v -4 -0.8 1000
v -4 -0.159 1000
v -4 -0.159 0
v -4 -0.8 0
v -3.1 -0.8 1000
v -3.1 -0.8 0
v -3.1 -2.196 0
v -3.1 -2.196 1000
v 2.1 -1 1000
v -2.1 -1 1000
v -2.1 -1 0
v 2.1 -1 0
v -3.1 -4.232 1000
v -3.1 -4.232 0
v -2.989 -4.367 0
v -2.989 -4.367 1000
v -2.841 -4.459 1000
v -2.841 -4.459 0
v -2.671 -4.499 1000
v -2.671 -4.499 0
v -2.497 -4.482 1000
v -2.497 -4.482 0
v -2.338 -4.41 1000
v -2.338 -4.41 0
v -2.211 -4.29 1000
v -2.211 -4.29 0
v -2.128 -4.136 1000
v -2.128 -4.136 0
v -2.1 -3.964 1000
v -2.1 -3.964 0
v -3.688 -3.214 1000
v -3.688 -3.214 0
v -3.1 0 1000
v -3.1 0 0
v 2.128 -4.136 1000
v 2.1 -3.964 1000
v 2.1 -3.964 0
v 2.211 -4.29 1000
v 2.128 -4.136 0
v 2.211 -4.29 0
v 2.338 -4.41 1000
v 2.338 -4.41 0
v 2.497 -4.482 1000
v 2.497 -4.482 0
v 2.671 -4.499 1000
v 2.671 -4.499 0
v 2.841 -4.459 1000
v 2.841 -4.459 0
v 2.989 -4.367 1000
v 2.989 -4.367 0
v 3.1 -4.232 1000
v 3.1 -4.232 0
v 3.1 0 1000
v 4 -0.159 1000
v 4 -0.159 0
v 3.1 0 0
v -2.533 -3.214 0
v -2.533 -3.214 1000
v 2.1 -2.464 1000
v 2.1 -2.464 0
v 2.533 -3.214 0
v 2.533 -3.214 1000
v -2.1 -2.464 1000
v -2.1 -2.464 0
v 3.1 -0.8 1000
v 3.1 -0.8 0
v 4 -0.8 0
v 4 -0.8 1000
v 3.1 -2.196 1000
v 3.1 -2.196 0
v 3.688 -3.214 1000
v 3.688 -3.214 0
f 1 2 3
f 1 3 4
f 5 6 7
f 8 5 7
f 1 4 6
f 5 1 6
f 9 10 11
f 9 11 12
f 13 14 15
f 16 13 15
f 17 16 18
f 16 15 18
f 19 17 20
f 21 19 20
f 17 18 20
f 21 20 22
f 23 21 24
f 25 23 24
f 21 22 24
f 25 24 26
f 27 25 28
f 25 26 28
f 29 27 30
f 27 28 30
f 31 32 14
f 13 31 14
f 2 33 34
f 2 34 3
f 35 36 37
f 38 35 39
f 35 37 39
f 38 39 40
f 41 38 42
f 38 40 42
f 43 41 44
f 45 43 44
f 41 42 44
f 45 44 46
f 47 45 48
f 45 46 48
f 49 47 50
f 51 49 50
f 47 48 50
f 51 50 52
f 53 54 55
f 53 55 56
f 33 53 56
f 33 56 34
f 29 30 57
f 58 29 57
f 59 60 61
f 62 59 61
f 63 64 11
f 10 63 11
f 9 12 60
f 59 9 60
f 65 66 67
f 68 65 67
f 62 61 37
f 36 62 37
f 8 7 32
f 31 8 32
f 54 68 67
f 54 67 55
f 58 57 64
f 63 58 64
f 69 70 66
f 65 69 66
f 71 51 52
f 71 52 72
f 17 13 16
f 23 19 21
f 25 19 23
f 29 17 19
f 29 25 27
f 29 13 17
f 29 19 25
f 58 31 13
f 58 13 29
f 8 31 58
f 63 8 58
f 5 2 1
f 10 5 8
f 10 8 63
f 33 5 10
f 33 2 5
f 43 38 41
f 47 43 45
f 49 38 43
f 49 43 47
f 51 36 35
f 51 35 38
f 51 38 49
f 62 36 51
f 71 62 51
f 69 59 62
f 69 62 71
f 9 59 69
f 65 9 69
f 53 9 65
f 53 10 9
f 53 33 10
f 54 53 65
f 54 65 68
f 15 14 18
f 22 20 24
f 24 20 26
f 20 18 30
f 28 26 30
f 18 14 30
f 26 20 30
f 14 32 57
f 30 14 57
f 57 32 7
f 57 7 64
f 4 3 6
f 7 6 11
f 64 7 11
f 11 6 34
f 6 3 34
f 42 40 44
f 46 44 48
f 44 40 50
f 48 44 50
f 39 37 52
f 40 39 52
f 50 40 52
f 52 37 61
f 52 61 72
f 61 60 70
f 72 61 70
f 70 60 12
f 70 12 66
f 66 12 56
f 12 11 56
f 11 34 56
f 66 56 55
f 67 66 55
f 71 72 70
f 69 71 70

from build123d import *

# Parameters (mm, degrees)
EXTRUDE_1_DEPTH = 1000


with BuildPart() as part:
    # Эскиз1 → Бобышка-Вытянуть1 (new body)
    with BuildSketch(Plane.XY):
        with BuildLine():
            Line((-3.1, 0), (-4, -0.158694283))
            Line((-4, -0.158694283), (-4, -0.8))
            Line((-4, -0.8), (-3.1, -0.8))
            Line((-3.1, -0.8), (-3.1, -2.196152423))
            Line((-3.1, -2.196152423), (-3.68771324, -3.214101615))
            Line((-3.68771324, -3.214101615), (-3.1, -4.232050808))
            ThreePointArc((-3.1, -4.232050808), (-2.497197677, -4.481739705), (-2.1, -3.964101615))
            Line((-2.1, -3.964101615), (-2.533012702, -3.214101615))
            Line((-2.533012702, -3.214101615), (-2.1, -2.464101615))
            Line((-2.1, -2.464101615), (-2.1, -1))
            Line((-2.1, -1), (2.1, -1))
            Line((2.1, -1), (2.1, -2.464101615))
            Line((2.1, -2.464101615), (2.533012702, -3.214101615))
            Line((2.533012702, -3.214101615), (2.1, -3.964101615))
            ThreePointArc((2.1, -3.964101615), (2.497197677, -4.481739705), (3.1, -4.232050808))
            Line((3.1, -4.232050808), (3.68771324, -3.214101615))
            Line((3.68771324, -3.214101615), (3.1, -2.196152423))
            Line((3.1, -2.196152423), (3.1, -0.8))
            Line((3.1, -0.8), (4, -0.8))
            Line((4, -0.8), (4, -0.158694283))
            Line((4, -0.158694283), (3.1, 0))
            Line((3.1, 0), (-3.1, 0))
        make_face()
    extrude(amount=EXTRUDE_1_DEPTH)


solid = part.part
